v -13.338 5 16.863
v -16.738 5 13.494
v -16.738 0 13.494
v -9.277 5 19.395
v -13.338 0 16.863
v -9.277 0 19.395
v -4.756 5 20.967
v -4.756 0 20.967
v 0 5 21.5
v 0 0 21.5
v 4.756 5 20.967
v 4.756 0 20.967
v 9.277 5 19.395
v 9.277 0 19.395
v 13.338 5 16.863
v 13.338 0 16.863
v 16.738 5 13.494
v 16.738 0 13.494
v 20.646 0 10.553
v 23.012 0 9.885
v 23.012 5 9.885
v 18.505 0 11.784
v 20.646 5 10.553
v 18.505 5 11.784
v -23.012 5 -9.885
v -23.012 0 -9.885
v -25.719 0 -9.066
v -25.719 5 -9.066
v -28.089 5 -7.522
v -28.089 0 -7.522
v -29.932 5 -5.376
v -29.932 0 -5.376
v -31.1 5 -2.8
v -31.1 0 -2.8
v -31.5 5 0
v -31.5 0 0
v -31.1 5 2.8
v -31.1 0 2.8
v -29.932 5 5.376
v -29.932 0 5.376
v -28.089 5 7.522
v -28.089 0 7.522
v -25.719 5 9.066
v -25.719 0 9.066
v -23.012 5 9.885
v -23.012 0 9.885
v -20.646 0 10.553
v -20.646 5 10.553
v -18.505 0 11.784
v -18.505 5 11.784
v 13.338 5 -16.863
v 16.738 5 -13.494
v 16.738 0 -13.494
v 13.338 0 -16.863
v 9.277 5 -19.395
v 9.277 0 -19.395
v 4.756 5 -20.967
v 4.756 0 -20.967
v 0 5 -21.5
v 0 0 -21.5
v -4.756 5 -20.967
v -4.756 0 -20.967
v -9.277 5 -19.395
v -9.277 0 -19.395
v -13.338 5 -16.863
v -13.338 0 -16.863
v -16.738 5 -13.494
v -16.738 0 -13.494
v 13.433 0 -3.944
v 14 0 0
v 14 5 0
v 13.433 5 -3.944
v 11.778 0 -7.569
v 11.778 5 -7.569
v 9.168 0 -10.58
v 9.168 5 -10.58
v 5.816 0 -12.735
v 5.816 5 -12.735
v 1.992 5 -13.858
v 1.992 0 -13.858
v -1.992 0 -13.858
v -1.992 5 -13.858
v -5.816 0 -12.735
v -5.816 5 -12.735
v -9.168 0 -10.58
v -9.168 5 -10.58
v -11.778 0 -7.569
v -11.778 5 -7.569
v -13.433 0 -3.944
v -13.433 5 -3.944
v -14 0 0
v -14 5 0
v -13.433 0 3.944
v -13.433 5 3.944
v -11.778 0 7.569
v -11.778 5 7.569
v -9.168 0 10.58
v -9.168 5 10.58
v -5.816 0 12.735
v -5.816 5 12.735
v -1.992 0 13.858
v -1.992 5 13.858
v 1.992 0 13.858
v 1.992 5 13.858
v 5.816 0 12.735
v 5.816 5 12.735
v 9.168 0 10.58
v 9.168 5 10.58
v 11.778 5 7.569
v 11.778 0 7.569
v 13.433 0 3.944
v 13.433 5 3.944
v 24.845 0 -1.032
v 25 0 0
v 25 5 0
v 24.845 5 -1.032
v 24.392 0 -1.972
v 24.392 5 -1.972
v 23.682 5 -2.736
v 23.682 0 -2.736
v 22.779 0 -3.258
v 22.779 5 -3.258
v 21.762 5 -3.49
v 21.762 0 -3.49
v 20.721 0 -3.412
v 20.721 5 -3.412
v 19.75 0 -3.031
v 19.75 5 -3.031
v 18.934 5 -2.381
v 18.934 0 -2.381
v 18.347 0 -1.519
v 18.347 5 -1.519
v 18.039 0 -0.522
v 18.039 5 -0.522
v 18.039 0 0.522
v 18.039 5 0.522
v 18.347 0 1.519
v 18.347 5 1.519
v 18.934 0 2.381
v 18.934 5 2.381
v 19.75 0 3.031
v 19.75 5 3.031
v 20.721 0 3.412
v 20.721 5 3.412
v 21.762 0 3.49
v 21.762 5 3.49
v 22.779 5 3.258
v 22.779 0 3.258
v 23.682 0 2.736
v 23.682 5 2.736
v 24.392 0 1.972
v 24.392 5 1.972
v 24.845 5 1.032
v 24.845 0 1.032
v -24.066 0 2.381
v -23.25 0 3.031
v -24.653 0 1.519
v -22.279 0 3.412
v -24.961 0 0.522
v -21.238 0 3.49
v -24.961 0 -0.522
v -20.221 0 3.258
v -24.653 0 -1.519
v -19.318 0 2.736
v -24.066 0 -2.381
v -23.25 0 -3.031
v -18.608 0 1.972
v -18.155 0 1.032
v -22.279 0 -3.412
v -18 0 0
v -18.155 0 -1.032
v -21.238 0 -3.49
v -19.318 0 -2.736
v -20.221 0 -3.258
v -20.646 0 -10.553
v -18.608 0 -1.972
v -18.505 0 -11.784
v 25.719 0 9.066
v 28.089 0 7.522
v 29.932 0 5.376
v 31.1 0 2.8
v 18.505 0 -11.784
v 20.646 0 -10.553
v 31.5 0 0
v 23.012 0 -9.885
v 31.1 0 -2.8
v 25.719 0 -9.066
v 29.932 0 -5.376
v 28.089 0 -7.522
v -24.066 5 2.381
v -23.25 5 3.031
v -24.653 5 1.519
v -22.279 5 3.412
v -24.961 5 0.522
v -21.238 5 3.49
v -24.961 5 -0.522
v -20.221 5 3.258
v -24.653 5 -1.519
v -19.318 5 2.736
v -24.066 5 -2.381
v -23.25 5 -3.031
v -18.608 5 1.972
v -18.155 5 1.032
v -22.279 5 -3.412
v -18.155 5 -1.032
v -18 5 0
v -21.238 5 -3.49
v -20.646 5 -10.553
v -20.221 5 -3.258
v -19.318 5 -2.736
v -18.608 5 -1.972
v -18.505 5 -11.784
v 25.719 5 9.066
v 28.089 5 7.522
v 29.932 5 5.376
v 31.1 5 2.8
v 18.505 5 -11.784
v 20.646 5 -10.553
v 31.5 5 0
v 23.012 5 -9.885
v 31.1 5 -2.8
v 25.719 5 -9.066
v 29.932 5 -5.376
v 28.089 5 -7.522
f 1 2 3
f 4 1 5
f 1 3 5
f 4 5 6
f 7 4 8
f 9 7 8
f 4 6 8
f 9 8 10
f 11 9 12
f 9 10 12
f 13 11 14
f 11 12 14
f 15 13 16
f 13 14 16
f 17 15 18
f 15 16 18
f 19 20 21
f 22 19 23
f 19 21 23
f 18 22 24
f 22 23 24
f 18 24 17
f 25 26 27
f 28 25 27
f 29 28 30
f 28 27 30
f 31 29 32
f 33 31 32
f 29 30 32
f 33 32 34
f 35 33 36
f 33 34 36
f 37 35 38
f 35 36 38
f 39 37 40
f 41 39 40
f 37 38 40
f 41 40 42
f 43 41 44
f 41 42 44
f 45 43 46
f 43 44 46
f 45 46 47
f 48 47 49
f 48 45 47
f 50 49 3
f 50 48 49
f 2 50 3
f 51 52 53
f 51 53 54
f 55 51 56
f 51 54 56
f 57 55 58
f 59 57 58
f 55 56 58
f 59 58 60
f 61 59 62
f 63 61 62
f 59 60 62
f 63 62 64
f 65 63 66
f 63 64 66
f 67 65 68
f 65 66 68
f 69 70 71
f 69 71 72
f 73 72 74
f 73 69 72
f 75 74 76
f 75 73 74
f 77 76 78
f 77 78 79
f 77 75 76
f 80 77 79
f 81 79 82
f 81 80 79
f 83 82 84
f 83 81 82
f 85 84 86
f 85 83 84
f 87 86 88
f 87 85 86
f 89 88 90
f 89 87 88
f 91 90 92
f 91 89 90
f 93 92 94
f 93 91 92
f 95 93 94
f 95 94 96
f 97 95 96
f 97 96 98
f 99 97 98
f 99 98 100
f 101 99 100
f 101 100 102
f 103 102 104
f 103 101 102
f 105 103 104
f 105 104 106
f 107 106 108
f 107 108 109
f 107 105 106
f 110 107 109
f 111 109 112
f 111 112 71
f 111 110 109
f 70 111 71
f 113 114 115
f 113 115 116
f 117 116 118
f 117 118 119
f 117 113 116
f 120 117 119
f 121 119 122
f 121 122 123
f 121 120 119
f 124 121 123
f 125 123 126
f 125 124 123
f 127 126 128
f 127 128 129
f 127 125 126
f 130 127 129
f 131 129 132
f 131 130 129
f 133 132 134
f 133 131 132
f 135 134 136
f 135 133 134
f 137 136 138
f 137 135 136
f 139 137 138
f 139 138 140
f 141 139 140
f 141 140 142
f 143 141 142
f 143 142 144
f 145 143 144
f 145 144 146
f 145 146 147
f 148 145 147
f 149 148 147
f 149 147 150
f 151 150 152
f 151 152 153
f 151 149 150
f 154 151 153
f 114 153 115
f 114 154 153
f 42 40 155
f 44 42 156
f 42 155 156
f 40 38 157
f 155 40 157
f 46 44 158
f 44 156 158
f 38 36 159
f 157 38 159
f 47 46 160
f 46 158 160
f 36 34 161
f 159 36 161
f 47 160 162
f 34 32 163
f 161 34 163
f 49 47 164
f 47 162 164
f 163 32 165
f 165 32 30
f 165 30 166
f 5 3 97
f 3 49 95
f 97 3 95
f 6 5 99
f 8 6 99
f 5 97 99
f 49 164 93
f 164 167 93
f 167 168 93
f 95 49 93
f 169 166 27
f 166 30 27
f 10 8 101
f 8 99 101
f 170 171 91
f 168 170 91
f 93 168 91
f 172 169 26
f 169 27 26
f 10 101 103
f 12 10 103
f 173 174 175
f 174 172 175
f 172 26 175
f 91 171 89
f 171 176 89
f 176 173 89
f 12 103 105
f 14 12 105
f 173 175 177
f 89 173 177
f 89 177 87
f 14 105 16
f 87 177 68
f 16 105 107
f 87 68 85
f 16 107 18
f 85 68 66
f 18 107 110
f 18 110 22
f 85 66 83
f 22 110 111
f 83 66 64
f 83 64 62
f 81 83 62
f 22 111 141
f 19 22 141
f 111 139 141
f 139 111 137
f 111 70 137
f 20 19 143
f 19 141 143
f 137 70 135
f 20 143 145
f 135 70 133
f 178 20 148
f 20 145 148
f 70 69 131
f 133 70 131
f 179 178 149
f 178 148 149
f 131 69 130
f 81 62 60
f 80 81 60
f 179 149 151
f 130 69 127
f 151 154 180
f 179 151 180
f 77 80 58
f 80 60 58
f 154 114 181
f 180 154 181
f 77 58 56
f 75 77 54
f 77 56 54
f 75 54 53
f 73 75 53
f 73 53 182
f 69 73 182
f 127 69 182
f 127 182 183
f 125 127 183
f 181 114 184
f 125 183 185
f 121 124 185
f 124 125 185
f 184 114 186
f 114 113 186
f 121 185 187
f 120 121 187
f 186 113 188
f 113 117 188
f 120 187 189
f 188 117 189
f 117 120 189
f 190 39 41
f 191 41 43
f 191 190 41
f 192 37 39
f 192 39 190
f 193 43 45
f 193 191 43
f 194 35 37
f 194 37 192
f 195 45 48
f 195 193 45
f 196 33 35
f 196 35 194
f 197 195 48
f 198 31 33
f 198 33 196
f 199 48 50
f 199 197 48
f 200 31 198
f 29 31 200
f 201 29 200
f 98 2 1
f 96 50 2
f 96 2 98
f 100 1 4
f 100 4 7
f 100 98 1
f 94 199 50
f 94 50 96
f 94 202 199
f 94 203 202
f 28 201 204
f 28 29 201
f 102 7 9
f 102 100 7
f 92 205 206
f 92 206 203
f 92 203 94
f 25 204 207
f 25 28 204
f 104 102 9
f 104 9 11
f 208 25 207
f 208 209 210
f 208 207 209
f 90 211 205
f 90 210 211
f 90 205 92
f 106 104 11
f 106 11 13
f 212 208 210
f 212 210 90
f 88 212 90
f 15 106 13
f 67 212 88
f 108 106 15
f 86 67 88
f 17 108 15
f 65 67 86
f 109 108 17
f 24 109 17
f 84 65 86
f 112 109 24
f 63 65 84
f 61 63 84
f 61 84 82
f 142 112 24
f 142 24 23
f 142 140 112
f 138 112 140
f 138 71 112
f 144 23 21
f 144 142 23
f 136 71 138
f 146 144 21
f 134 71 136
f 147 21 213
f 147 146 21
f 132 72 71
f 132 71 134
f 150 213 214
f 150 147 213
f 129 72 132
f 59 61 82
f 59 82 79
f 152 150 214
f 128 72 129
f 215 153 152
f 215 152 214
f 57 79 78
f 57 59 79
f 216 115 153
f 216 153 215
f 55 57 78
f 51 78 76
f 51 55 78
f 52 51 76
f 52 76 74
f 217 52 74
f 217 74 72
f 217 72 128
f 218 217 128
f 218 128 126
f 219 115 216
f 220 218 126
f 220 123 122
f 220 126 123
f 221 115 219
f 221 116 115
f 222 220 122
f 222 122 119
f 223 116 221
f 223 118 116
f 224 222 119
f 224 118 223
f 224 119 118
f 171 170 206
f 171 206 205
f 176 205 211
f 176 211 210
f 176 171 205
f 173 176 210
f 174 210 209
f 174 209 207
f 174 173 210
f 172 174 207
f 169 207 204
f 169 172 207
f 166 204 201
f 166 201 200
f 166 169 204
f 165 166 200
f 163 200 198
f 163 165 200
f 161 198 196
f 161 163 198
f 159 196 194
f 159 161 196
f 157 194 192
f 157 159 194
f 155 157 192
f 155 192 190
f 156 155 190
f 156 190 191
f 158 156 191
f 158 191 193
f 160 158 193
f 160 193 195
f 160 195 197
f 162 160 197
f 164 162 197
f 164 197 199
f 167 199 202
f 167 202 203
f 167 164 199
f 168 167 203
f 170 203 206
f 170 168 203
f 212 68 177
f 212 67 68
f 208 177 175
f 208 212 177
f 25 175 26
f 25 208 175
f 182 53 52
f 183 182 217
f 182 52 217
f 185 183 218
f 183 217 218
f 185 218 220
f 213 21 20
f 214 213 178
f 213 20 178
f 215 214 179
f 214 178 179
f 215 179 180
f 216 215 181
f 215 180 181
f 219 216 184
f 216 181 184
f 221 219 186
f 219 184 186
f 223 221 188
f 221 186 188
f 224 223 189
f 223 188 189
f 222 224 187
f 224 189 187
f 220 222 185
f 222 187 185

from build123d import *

# Parameters (mm, degrees)
BOSS_EXTRUDE2_OUTLINE_R   = 3.5
BOSS_EXTRUDE2_OUTLINE_R_2 = 14
BOSS_EXTRUDE2_DEPTH       = 5
FILLET2_R                 = 10


# Read off the part's stored shape, not the designer's step: Boss-Extrude2
with BuildPart() as part:
    # Boss-Extrude2 outline → Boss-Extrude2 (new body)
    with BuildSketch(Plane(origin=(0, 0, 0), x_dir=(1, 0, 0), z_dir=(0, 1, 0))):
        with BuildLine():
            ThreePointArc((19.174418605, 9.725824961), (0, 21.5), (-19.174418605, 9.725824961))
            ThreePointArc((-19.174418605, 9.725824961), (-31.5, 0), (-19.174418605, -9.725824961))
            ThreePointArc((-19.174418605, -9.725824961), (0, -21.5), (19.174418605, -9.725824961))
            ThreePointArc((19.174418605, -9.725824961), (31.5, 0), (19.174418605, 9.725824961))
        make_face()
        with Locations((-21.5, 0)):
            Circle(BOSS_EXTRUDE2_OUTLINE_R, mode=Mode.SUBTRACT)
        Circle(BOSS_EXTRUDE2_OUTLINE_R_2, mode=Mode.SUBTRACT)
        with Locations((21.5, 0)):
            Circle(BOSS_EXTRUDE2_OUTLINE_R, mode=Mode.SUBTRACT)
    extrude(amount=BOSS_EXTRUDE2_DEPTH)

    # Fillet2
    fillet2_edges = [part.edges().sort_by_distance(p)[0] for p in [
        (19.174418605, 2.5, -9.725824961),
        (19.174418605, 2.5, 9.725824961),
        (-19.174418605, 2.5, 9.725824961),
        (-19.174418605, 2.5, -9.725824961),
    ]]
    fillet(fillet2_edges, radius=FILLET2_R)


solid = part.part
